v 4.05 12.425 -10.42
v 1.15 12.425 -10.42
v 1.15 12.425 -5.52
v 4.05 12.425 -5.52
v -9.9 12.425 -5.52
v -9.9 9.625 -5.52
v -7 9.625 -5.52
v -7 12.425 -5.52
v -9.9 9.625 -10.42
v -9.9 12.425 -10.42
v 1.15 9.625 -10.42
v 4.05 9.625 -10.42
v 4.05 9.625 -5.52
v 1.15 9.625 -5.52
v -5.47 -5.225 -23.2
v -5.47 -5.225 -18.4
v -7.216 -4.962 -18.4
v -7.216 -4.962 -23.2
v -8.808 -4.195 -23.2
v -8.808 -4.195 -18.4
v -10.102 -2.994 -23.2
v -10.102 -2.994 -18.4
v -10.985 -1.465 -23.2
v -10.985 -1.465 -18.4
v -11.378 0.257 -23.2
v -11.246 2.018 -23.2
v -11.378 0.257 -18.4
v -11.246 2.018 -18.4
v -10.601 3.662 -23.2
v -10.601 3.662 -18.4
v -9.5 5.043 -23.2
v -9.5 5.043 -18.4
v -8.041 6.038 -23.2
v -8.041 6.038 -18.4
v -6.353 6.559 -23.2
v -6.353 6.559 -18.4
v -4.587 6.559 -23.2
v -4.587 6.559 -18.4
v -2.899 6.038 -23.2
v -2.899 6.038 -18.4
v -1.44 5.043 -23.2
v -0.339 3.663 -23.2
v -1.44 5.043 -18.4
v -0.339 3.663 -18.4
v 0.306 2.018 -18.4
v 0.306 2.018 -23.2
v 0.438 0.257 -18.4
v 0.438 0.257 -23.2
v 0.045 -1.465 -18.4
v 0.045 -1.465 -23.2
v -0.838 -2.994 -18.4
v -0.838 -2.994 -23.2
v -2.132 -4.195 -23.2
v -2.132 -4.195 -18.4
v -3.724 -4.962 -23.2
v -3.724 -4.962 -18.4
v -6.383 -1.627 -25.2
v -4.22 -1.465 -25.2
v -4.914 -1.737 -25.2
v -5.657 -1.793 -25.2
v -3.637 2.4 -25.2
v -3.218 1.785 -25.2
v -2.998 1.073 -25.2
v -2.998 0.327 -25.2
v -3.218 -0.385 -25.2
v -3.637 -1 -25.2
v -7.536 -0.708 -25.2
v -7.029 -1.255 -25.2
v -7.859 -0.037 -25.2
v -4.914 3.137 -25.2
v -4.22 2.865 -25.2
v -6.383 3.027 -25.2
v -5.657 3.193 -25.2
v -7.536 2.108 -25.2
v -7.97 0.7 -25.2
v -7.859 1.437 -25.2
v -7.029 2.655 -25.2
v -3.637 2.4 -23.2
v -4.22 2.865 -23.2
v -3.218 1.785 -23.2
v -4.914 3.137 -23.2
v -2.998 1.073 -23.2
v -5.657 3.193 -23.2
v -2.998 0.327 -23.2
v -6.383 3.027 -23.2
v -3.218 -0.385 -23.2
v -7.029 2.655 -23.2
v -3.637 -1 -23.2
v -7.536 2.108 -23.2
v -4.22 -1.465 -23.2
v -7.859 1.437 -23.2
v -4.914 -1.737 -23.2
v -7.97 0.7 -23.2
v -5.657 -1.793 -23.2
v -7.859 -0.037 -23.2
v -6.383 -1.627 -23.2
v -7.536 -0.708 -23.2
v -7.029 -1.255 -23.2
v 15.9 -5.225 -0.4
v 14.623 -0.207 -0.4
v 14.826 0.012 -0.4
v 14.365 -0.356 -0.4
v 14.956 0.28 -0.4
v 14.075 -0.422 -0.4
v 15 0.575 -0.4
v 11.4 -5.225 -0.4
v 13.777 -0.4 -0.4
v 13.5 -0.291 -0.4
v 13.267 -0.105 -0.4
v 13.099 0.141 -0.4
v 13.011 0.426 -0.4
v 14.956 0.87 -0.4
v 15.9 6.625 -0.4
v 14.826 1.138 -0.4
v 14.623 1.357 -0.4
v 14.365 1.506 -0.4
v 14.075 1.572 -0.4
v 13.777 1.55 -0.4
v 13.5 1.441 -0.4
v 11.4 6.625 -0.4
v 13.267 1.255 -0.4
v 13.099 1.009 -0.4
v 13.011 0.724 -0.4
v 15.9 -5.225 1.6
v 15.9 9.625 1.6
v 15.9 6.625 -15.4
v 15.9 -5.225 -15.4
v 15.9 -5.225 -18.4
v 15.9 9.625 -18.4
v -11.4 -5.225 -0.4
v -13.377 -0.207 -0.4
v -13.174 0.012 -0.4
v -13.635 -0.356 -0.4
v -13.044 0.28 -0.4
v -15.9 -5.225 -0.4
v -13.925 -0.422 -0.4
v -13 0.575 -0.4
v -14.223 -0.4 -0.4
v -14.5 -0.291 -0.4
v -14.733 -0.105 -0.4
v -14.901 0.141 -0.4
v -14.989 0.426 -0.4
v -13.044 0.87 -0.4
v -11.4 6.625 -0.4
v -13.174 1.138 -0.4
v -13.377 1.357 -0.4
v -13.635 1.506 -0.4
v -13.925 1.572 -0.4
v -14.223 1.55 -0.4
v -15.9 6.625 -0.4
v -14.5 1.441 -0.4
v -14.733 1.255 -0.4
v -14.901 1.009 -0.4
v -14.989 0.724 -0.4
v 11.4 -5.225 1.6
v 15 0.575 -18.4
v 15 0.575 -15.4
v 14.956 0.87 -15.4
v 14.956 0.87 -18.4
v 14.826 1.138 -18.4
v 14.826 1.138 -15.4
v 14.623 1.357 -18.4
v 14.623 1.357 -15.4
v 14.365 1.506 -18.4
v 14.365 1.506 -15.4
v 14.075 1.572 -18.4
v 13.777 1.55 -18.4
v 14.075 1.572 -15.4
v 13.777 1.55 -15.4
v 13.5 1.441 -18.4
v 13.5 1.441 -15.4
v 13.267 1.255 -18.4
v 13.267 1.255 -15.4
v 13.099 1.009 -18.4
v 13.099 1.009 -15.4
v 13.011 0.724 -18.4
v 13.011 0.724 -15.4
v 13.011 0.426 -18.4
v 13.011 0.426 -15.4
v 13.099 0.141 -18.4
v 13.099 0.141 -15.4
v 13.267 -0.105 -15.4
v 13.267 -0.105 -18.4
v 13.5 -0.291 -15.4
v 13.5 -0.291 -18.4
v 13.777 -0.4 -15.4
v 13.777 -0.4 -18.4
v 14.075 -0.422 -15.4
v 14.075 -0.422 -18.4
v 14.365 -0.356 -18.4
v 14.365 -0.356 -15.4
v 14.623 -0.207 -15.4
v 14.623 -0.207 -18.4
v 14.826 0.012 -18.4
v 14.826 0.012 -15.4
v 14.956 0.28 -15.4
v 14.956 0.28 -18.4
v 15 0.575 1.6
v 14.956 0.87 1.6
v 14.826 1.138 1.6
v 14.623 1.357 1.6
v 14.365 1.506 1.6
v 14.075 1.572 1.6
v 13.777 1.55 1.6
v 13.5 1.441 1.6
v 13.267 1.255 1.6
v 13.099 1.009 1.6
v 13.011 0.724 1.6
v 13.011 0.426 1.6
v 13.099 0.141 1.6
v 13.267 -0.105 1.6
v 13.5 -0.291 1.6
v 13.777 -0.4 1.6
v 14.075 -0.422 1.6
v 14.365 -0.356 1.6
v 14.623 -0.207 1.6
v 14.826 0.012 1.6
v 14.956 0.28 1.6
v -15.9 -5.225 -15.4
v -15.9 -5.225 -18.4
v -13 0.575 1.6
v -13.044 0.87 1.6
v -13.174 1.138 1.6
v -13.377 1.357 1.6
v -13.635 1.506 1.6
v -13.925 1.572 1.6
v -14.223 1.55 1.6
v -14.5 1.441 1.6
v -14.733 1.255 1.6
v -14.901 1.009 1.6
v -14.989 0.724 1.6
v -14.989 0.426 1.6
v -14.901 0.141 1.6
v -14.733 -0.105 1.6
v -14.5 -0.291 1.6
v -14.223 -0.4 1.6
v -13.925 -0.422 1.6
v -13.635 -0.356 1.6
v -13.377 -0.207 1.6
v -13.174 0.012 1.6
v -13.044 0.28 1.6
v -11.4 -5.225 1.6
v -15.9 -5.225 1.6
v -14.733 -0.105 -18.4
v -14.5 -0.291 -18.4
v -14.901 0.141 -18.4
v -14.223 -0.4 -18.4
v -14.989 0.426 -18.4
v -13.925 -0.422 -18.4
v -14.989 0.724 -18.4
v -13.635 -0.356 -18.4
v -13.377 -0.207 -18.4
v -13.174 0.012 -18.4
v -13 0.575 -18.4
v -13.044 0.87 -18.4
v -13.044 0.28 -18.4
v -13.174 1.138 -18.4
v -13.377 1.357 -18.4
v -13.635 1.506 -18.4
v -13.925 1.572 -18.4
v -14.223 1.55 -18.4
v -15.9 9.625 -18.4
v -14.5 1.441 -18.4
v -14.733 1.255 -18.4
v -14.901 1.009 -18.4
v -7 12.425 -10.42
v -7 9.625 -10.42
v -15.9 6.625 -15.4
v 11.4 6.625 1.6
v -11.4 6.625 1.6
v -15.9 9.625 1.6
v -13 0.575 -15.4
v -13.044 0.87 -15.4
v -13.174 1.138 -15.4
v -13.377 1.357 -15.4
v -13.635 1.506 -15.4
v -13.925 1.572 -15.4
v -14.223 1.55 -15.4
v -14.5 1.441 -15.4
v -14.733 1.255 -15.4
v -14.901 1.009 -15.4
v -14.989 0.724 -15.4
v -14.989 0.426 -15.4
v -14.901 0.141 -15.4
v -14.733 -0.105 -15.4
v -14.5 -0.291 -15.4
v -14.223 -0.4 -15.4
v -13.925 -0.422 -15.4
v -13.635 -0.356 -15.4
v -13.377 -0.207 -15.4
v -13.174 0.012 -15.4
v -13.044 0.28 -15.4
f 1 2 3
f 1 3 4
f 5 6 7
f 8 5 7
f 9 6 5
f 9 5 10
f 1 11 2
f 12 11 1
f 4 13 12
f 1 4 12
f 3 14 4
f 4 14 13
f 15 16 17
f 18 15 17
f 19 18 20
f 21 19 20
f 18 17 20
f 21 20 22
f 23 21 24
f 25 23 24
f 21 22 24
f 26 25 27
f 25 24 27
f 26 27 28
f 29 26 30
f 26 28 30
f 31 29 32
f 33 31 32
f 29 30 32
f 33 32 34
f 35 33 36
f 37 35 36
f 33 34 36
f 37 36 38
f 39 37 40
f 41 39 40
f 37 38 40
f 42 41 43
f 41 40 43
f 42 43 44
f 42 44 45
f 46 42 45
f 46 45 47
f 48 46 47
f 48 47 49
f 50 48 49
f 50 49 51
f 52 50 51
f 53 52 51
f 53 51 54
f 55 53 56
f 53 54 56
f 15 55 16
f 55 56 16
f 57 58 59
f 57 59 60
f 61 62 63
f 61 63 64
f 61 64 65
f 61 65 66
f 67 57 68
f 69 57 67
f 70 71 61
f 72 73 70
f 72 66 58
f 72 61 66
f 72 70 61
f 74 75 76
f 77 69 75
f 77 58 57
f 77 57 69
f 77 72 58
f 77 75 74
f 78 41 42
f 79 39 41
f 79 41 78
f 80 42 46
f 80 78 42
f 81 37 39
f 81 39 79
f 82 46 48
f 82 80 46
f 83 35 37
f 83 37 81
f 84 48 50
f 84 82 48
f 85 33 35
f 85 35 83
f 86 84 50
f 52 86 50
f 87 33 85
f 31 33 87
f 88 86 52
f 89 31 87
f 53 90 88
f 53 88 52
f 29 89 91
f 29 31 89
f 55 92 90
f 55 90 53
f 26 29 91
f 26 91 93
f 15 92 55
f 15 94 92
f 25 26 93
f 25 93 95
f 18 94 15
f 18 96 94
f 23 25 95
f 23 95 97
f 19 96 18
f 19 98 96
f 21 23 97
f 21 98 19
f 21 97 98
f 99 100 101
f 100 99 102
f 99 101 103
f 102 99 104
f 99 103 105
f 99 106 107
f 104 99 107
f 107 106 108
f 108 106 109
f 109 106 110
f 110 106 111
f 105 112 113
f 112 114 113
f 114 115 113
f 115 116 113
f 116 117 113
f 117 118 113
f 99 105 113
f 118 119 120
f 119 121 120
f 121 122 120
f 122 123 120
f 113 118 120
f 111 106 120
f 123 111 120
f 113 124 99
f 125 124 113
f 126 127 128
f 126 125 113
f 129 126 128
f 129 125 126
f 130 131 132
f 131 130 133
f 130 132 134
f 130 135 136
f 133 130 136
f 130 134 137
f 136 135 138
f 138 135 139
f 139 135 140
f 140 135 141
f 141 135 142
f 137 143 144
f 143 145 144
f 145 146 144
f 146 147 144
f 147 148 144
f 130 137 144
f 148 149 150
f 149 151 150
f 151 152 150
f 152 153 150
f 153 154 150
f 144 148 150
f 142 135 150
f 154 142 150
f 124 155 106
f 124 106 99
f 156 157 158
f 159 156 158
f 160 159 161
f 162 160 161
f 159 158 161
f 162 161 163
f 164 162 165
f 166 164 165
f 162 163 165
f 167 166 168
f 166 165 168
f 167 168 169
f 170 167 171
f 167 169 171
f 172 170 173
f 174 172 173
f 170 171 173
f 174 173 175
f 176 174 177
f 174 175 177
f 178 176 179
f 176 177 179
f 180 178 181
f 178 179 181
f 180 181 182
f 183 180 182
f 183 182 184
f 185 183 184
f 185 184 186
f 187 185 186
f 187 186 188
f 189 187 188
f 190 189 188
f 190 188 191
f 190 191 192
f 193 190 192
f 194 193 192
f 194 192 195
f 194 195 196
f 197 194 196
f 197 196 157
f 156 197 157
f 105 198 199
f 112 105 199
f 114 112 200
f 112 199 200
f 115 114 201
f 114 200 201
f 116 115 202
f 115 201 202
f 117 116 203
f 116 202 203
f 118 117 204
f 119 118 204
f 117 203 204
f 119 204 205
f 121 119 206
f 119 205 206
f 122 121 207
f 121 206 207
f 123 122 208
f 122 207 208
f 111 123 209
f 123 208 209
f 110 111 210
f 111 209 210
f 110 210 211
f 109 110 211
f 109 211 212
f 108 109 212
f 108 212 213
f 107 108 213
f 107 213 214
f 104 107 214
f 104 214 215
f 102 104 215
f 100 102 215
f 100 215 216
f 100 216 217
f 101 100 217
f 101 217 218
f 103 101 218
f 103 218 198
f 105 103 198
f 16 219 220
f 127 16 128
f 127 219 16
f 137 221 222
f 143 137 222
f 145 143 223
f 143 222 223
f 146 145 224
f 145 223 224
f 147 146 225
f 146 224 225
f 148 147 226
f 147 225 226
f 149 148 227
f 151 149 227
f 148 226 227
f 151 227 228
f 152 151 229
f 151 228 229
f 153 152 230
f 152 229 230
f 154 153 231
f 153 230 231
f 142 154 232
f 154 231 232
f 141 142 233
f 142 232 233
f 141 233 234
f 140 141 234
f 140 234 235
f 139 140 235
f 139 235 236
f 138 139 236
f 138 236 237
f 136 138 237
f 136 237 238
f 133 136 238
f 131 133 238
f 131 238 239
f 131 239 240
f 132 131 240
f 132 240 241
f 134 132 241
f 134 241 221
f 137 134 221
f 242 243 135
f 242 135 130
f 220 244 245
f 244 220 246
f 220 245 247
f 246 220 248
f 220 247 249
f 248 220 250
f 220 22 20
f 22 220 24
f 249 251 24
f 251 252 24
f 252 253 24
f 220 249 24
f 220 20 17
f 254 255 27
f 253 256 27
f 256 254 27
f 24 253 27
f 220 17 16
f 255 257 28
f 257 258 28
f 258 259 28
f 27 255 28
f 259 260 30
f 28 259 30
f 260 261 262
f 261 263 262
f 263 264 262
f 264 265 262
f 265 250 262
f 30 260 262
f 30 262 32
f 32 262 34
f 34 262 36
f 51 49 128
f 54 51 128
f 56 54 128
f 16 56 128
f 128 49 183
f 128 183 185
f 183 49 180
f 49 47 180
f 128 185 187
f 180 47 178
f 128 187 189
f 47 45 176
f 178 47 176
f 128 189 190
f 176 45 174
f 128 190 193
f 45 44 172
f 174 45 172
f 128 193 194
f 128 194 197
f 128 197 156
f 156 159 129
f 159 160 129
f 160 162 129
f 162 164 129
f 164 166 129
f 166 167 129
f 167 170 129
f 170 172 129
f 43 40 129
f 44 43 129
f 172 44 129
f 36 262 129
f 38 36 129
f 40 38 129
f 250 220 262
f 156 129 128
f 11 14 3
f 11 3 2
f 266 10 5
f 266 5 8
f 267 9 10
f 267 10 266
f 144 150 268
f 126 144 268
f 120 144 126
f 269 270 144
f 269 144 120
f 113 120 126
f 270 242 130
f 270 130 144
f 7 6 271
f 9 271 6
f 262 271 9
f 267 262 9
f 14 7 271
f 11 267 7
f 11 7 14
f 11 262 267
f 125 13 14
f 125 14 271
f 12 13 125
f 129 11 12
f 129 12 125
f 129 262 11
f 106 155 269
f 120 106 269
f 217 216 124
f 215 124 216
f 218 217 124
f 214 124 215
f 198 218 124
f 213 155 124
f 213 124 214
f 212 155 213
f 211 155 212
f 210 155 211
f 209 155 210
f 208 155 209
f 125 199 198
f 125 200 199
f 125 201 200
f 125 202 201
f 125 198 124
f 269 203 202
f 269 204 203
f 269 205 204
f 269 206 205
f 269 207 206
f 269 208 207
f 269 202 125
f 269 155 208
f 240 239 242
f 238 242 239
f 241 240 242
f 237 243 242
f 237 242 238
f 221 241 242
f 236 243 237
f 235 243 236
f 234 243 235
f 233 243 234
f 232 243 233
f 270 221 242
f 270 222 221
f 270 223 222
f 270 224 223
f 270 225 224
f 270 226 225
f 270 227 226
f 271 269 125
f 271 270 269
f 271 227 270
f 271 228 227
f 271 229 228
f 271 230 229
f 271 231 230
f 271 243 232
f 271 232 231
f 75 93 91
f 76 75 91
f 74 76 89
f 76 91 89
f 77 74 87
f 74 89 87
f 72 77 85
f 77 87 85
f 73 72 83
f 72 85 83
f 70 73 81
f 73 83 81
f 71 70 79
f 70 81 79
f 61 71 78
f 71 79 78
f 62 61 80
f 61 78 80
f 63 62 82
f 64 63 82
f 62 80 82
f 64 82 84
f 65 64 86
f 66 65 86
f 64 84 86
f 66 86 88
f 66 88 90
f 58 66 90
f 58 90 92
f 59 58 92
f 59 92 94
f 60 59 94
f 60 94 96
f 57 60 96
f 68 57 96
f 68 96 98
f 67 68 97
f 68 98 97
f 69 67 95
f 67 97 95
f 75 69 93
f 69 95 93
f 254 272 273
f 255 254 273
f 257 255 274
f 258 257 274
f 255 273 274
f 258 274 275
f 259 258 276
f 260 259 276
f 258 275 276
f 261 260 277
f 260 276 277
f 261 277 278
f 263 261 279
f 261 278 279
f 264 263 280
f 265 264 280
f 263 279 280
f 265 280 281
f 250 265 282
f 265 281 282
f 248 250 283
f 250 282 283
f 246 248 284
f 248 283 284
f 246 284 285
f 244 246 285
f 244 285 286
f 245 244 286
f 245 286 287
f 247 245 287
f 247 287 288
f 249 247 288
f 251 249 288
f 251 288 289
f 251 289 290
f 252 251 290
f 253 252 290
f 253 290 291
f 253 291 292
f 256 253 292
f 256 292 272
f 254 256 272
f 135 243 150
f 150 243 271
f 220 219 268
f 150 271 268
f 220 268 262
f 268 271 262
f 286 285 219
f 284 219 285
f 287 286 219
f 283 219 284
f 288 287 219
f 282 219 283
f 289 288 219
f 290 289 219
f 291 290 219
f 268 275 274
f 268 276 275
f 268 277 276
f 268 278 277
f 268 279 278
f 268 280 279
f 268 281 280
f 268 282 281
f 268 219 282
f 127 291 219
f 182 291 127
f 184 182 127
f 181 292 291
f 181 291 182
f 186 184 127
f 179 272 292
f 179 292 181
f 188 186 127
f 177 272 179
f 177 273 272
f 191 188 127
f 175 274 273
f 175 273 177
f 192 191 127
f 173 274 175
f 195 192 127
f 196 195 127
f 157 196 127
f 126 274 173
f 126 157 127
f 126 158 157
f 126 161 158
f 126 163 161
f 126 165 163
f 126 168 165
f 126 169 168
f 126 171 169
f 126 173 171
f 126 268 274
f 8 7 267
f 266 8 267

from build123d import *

# Parameters (mm, degrees)
SKETCH1_W            = 31.8
SKETCH1_H            = 13.25
BOSS_EXTRUDE3_DEPTH  = 3
SKETCH3_W            = 31.8
SKETCH3_H            = 3
BOSS_EXTRUDE4_DEPTH  = 24
SKETCH4_W            = 22.8
SKETCH4_H            = 13.25
CUT_EXTRUDE3_DEPTH   = 3
SKETCH6_W            = 31.8
SKETCH6_H            = 2
BOSS_EXTRUDE5_DEPTH  = 13.25
SKETCH7_W            = 3.6
SKETCH7_H            = 3
CUT_EXTRUDE4_DEPTH   = 40.30496947
SKETCH8_W            = 2
SKETCH8_H            = 1.25
BOSS_EXTRUDE6_DEPTH  = 31.8
SKETCH10_W           = 2
SKETCH10_H           = 17.5
CUT_EXTRUDE6_DEPTH   = 38.505207972
BOSS_EXTRUDE7_START  = -31.8
SKETCH11_W           = 3
SKETCH11_H           = 1.25
BOSS_EXTRUDE7_DEPTH  = 31.8
SKETCH12_W           = 22.8
SKETCH12_H           = 1.25
CUT_EXTRUDE7_DEPTH   = 4
SKETCH15_W           = 31.8
SKETCH15_H           = 3
BOSS_EXTRUDE9_DEPTH  = 17.5
BOSS_EXTRUDE12_DEPTH = 5
SKETCH20_W           = 15
SKETCH20_H           = 14.5
SKETCH20_W_2         = 5.230602644
SKETCH20_H_2         = 17.5
CUT_EXTRUDE9_DEPTH   = 100
SKETCH22_R           = 1
SKETCH22_W           = 31.8
SKETCH22_H           = 2.65
CUT_EXTRUDE11_DEPTH  = 20
SKETCH24_R           = 5.925
BOSS_EXTRUDE13_DEPTH = 4.8
SKETCH25_R           = 2.5
BOSS_EXTRUDE14_DEPTH = 2
SKETCH26_W           = 2.9
SKETCH26_H           = 4.9
BOSS_EXTRUDE15_DEPTH = 2.8


with BuildPart() as part:
    # Sketch1 → Boss-Extrude3 (new body)
    with BuildSketch(Plane.XY):
        Rectangle(SKETCH1_W, SKETCH1_H)
    extrude(amount=BOSS_EXTRUDE3_DEPTH)

    # Sketch3 → Boss-Extrude4 (add)
    with BuildSketch(Plane.XY.offset(3)):
        with Locations((0, 8.125)):
            Rectangle(SKETCH3_W, SKETCH3_H)
    extrude(amount=-BOSS_EXTRUDE4_DEPTH)

    # Sketch4 → Cut-Extrude3 (cut)
    with BuildSketch(Plane.XY.offset(3)):
        Rectangle(SKETCH4_W, SKETCH4_H)
    extrude(amount=-CUT_EXTRUDE3_DEPTH, mode=Mode.SUBTRACT)

    # Sketch6 → Boss-Extrude5 (add)
    with BuildSketch(Plane.XZ.offset(-6.625)):
        with Locations((0, -16.4)):
            Rectangle(SKETCH6_W, SKETCH6_H)
    extrude(amount=BOSS_EXTRUDE5_DEPTH)

    # Sketch7 → Cut-Extrude4 (cut, through all)
    with BuildSketch(Plane.ZY.offset(15.9)):
        with Locations((-19.2, 8.125)):
            Rectangle(SKETCH7_W, SKETCH7_H)
    extrude(amount=-CUT_EXTRUDE4_DEPTH, mode=Mode.SUBTRACT)

    # Sketch8 → Boss-Extrude6 (add)
    with BuildSketch(Plane(origin=(15.9, 0, 0), x_dir=(0, 0, -1), z_dir=(1, 0, 0))):
        with Locations((16.4, -7.25)):
            Rectangle(SKETCH8_W, SKETCH8_H)
    extrude(amount=-BOSS_EXTRUDE6_DEPTH)

    # Sketch10 → Cut-Extrude6 (cut, through all)
    with BuildSketch(Plane(origin=(15.9, 0, 0), x_dir=(0, 0, -1), z_dir=(1, 0, 0))):
        with Locations((16.4, 0.875)):
            Rectangle(SKETCH10_W, SKETCH10_H)
    extrude(amount=-CUT_EXTRUDE6_DEPTH, mode=Mode.SUBTRACT)

    # Sketch11 → Boss-Extrude7 (add)
    with BuildSketch(Plane(origin=(15.9, 0, 0), x_dir=(0, 0, -1), z_dir=(1, 0, 0)).offset(BOSS_EXTRUDE7_START)):
        with Locations((-1.5, -7.25)):
            Rectangle(SKETCH11_W, SKETCH11_H)
    boss_extrude7 = extrude(amount=BOSS_EXTRUDE7_DEPTH)

    # Mirror2: Boss-Extrude7 across plane
    add(boss_extrude7.mirror(Plane(origin=(0, 0, 0), x_dir=(0, 0, 1), z_dir=(1, 0, 0))))

    # Sketch12 → Cut-Extrude7 (cut)
    with BuildSketch(Plane.XY.offset(3)):
        with Locations((0, -7.25)):
            Rectangle(SKETCH12_W, SKETCH12_H)
    extrude(amount=-CUT_EXTRUDE7_DEPTH, mode=Mode.SUBTRACT)

    # Sketch15 → Boss-Extrude9 (add)
    with BuildSketch(Plane(origin=(0, 9.625, 0), x_dir=(1, 0, 0), z_dir=(0, 1, 0))):
        with Locations((0, 16.9)):
            Rectangle(SKETCH15_W, SKETCH15_H)
    extrude(amount=-BOSS_EXTRUDE9_DEPTH)

    # Sketch19 → Boss-Extrude12 (add)
    with BuildSketch(Plane.XY.offset(3)):
        Polygon((-15.9, 9.625), (15.9, 9.625), (15.9, -7.875), (11.4, -7.875), (11.4, 6.625), (-11.4, 6.625), (-11.4, -7.875), (-15.9, -7.875), align=None)
    extrude(amount=-BOSS_EXTRUDE12_DEPTH)

    # Sketch20 → Cut-Extrude9 (cut)
    with BuildSketch(Plane.ZY.offset(15.9)):
        with Locations((-7.9, -0.625)):
            Rectangle(SKETCH20_W, SKETCH20_H)
        with Locations((4.215301322, 0.875)):
            Rectangle(SKETCH20_W_2, SKETCH20_H_2)
    extrude(amount=-CUT_EXTRUDE9_DEPTH, mode=Mode.SUBTRACT)

    # Sketch22 → Cut-Extrude11 (cut)
    with BuildSketch(Plane.XY.offset(1.6)):
        with Locations((-14, 0.575)):
            Circle(SKETCH22_R)
        with Locations((14, 0.575)):
            Circle(SKETCH22_R)
        with Locations((0, -6.55)):
            Rectangle(SKETCH22_W, SKETCH22_H)
    extrude(amount=-CUT_EXTRUDE11_DEPTH, mode=Mode.SUBTRACT)

    # Sketch24 → Boss-Extrude13 (add)
    with BuildSketch(Plane(origin=(0, 0, -18.4), x_dir=(-1, 0, 0), z_dir=(0, 0, -1))):
        with Locations(Location((5.47, 0.7, 0), (0, 0, 270))):
            Circle(SKETCH24_R)
    extrude(amount=BOSS_EXTRUDE13_DEPTH)

    # Sketch25 → Boss-Extrude14 (add)
    with BuildSketch(Plane(origin=(0, 0, -23.2), x_dir=(-1, 0, 0), z_dir=(0, 0, -1))):
        with Locations((5.47, 0.7)):
            Circle(SKETCH25_R)
    extrude(amount=BOSS_EXTRUDE14_DEPTH)

    # Sketch26 → Boss-Extrude15 (add)
    with BuildSketch(Plane(origin=(0, 9.625, 0), x_dir=(1, 0, 0), z_dir=(0, 1, 0))):
        with Locations((-8.45, 7.97)):
            Rectangle(SKETCH26_W, SKETCH26_H)
        with Locations((2.6, 7.97)):
            Rectangle(SKETCH26_W, SKETCH26_H)
    extrude(amount=BOSS_EXTRUDE15_DEPTH)


solid = part.part
